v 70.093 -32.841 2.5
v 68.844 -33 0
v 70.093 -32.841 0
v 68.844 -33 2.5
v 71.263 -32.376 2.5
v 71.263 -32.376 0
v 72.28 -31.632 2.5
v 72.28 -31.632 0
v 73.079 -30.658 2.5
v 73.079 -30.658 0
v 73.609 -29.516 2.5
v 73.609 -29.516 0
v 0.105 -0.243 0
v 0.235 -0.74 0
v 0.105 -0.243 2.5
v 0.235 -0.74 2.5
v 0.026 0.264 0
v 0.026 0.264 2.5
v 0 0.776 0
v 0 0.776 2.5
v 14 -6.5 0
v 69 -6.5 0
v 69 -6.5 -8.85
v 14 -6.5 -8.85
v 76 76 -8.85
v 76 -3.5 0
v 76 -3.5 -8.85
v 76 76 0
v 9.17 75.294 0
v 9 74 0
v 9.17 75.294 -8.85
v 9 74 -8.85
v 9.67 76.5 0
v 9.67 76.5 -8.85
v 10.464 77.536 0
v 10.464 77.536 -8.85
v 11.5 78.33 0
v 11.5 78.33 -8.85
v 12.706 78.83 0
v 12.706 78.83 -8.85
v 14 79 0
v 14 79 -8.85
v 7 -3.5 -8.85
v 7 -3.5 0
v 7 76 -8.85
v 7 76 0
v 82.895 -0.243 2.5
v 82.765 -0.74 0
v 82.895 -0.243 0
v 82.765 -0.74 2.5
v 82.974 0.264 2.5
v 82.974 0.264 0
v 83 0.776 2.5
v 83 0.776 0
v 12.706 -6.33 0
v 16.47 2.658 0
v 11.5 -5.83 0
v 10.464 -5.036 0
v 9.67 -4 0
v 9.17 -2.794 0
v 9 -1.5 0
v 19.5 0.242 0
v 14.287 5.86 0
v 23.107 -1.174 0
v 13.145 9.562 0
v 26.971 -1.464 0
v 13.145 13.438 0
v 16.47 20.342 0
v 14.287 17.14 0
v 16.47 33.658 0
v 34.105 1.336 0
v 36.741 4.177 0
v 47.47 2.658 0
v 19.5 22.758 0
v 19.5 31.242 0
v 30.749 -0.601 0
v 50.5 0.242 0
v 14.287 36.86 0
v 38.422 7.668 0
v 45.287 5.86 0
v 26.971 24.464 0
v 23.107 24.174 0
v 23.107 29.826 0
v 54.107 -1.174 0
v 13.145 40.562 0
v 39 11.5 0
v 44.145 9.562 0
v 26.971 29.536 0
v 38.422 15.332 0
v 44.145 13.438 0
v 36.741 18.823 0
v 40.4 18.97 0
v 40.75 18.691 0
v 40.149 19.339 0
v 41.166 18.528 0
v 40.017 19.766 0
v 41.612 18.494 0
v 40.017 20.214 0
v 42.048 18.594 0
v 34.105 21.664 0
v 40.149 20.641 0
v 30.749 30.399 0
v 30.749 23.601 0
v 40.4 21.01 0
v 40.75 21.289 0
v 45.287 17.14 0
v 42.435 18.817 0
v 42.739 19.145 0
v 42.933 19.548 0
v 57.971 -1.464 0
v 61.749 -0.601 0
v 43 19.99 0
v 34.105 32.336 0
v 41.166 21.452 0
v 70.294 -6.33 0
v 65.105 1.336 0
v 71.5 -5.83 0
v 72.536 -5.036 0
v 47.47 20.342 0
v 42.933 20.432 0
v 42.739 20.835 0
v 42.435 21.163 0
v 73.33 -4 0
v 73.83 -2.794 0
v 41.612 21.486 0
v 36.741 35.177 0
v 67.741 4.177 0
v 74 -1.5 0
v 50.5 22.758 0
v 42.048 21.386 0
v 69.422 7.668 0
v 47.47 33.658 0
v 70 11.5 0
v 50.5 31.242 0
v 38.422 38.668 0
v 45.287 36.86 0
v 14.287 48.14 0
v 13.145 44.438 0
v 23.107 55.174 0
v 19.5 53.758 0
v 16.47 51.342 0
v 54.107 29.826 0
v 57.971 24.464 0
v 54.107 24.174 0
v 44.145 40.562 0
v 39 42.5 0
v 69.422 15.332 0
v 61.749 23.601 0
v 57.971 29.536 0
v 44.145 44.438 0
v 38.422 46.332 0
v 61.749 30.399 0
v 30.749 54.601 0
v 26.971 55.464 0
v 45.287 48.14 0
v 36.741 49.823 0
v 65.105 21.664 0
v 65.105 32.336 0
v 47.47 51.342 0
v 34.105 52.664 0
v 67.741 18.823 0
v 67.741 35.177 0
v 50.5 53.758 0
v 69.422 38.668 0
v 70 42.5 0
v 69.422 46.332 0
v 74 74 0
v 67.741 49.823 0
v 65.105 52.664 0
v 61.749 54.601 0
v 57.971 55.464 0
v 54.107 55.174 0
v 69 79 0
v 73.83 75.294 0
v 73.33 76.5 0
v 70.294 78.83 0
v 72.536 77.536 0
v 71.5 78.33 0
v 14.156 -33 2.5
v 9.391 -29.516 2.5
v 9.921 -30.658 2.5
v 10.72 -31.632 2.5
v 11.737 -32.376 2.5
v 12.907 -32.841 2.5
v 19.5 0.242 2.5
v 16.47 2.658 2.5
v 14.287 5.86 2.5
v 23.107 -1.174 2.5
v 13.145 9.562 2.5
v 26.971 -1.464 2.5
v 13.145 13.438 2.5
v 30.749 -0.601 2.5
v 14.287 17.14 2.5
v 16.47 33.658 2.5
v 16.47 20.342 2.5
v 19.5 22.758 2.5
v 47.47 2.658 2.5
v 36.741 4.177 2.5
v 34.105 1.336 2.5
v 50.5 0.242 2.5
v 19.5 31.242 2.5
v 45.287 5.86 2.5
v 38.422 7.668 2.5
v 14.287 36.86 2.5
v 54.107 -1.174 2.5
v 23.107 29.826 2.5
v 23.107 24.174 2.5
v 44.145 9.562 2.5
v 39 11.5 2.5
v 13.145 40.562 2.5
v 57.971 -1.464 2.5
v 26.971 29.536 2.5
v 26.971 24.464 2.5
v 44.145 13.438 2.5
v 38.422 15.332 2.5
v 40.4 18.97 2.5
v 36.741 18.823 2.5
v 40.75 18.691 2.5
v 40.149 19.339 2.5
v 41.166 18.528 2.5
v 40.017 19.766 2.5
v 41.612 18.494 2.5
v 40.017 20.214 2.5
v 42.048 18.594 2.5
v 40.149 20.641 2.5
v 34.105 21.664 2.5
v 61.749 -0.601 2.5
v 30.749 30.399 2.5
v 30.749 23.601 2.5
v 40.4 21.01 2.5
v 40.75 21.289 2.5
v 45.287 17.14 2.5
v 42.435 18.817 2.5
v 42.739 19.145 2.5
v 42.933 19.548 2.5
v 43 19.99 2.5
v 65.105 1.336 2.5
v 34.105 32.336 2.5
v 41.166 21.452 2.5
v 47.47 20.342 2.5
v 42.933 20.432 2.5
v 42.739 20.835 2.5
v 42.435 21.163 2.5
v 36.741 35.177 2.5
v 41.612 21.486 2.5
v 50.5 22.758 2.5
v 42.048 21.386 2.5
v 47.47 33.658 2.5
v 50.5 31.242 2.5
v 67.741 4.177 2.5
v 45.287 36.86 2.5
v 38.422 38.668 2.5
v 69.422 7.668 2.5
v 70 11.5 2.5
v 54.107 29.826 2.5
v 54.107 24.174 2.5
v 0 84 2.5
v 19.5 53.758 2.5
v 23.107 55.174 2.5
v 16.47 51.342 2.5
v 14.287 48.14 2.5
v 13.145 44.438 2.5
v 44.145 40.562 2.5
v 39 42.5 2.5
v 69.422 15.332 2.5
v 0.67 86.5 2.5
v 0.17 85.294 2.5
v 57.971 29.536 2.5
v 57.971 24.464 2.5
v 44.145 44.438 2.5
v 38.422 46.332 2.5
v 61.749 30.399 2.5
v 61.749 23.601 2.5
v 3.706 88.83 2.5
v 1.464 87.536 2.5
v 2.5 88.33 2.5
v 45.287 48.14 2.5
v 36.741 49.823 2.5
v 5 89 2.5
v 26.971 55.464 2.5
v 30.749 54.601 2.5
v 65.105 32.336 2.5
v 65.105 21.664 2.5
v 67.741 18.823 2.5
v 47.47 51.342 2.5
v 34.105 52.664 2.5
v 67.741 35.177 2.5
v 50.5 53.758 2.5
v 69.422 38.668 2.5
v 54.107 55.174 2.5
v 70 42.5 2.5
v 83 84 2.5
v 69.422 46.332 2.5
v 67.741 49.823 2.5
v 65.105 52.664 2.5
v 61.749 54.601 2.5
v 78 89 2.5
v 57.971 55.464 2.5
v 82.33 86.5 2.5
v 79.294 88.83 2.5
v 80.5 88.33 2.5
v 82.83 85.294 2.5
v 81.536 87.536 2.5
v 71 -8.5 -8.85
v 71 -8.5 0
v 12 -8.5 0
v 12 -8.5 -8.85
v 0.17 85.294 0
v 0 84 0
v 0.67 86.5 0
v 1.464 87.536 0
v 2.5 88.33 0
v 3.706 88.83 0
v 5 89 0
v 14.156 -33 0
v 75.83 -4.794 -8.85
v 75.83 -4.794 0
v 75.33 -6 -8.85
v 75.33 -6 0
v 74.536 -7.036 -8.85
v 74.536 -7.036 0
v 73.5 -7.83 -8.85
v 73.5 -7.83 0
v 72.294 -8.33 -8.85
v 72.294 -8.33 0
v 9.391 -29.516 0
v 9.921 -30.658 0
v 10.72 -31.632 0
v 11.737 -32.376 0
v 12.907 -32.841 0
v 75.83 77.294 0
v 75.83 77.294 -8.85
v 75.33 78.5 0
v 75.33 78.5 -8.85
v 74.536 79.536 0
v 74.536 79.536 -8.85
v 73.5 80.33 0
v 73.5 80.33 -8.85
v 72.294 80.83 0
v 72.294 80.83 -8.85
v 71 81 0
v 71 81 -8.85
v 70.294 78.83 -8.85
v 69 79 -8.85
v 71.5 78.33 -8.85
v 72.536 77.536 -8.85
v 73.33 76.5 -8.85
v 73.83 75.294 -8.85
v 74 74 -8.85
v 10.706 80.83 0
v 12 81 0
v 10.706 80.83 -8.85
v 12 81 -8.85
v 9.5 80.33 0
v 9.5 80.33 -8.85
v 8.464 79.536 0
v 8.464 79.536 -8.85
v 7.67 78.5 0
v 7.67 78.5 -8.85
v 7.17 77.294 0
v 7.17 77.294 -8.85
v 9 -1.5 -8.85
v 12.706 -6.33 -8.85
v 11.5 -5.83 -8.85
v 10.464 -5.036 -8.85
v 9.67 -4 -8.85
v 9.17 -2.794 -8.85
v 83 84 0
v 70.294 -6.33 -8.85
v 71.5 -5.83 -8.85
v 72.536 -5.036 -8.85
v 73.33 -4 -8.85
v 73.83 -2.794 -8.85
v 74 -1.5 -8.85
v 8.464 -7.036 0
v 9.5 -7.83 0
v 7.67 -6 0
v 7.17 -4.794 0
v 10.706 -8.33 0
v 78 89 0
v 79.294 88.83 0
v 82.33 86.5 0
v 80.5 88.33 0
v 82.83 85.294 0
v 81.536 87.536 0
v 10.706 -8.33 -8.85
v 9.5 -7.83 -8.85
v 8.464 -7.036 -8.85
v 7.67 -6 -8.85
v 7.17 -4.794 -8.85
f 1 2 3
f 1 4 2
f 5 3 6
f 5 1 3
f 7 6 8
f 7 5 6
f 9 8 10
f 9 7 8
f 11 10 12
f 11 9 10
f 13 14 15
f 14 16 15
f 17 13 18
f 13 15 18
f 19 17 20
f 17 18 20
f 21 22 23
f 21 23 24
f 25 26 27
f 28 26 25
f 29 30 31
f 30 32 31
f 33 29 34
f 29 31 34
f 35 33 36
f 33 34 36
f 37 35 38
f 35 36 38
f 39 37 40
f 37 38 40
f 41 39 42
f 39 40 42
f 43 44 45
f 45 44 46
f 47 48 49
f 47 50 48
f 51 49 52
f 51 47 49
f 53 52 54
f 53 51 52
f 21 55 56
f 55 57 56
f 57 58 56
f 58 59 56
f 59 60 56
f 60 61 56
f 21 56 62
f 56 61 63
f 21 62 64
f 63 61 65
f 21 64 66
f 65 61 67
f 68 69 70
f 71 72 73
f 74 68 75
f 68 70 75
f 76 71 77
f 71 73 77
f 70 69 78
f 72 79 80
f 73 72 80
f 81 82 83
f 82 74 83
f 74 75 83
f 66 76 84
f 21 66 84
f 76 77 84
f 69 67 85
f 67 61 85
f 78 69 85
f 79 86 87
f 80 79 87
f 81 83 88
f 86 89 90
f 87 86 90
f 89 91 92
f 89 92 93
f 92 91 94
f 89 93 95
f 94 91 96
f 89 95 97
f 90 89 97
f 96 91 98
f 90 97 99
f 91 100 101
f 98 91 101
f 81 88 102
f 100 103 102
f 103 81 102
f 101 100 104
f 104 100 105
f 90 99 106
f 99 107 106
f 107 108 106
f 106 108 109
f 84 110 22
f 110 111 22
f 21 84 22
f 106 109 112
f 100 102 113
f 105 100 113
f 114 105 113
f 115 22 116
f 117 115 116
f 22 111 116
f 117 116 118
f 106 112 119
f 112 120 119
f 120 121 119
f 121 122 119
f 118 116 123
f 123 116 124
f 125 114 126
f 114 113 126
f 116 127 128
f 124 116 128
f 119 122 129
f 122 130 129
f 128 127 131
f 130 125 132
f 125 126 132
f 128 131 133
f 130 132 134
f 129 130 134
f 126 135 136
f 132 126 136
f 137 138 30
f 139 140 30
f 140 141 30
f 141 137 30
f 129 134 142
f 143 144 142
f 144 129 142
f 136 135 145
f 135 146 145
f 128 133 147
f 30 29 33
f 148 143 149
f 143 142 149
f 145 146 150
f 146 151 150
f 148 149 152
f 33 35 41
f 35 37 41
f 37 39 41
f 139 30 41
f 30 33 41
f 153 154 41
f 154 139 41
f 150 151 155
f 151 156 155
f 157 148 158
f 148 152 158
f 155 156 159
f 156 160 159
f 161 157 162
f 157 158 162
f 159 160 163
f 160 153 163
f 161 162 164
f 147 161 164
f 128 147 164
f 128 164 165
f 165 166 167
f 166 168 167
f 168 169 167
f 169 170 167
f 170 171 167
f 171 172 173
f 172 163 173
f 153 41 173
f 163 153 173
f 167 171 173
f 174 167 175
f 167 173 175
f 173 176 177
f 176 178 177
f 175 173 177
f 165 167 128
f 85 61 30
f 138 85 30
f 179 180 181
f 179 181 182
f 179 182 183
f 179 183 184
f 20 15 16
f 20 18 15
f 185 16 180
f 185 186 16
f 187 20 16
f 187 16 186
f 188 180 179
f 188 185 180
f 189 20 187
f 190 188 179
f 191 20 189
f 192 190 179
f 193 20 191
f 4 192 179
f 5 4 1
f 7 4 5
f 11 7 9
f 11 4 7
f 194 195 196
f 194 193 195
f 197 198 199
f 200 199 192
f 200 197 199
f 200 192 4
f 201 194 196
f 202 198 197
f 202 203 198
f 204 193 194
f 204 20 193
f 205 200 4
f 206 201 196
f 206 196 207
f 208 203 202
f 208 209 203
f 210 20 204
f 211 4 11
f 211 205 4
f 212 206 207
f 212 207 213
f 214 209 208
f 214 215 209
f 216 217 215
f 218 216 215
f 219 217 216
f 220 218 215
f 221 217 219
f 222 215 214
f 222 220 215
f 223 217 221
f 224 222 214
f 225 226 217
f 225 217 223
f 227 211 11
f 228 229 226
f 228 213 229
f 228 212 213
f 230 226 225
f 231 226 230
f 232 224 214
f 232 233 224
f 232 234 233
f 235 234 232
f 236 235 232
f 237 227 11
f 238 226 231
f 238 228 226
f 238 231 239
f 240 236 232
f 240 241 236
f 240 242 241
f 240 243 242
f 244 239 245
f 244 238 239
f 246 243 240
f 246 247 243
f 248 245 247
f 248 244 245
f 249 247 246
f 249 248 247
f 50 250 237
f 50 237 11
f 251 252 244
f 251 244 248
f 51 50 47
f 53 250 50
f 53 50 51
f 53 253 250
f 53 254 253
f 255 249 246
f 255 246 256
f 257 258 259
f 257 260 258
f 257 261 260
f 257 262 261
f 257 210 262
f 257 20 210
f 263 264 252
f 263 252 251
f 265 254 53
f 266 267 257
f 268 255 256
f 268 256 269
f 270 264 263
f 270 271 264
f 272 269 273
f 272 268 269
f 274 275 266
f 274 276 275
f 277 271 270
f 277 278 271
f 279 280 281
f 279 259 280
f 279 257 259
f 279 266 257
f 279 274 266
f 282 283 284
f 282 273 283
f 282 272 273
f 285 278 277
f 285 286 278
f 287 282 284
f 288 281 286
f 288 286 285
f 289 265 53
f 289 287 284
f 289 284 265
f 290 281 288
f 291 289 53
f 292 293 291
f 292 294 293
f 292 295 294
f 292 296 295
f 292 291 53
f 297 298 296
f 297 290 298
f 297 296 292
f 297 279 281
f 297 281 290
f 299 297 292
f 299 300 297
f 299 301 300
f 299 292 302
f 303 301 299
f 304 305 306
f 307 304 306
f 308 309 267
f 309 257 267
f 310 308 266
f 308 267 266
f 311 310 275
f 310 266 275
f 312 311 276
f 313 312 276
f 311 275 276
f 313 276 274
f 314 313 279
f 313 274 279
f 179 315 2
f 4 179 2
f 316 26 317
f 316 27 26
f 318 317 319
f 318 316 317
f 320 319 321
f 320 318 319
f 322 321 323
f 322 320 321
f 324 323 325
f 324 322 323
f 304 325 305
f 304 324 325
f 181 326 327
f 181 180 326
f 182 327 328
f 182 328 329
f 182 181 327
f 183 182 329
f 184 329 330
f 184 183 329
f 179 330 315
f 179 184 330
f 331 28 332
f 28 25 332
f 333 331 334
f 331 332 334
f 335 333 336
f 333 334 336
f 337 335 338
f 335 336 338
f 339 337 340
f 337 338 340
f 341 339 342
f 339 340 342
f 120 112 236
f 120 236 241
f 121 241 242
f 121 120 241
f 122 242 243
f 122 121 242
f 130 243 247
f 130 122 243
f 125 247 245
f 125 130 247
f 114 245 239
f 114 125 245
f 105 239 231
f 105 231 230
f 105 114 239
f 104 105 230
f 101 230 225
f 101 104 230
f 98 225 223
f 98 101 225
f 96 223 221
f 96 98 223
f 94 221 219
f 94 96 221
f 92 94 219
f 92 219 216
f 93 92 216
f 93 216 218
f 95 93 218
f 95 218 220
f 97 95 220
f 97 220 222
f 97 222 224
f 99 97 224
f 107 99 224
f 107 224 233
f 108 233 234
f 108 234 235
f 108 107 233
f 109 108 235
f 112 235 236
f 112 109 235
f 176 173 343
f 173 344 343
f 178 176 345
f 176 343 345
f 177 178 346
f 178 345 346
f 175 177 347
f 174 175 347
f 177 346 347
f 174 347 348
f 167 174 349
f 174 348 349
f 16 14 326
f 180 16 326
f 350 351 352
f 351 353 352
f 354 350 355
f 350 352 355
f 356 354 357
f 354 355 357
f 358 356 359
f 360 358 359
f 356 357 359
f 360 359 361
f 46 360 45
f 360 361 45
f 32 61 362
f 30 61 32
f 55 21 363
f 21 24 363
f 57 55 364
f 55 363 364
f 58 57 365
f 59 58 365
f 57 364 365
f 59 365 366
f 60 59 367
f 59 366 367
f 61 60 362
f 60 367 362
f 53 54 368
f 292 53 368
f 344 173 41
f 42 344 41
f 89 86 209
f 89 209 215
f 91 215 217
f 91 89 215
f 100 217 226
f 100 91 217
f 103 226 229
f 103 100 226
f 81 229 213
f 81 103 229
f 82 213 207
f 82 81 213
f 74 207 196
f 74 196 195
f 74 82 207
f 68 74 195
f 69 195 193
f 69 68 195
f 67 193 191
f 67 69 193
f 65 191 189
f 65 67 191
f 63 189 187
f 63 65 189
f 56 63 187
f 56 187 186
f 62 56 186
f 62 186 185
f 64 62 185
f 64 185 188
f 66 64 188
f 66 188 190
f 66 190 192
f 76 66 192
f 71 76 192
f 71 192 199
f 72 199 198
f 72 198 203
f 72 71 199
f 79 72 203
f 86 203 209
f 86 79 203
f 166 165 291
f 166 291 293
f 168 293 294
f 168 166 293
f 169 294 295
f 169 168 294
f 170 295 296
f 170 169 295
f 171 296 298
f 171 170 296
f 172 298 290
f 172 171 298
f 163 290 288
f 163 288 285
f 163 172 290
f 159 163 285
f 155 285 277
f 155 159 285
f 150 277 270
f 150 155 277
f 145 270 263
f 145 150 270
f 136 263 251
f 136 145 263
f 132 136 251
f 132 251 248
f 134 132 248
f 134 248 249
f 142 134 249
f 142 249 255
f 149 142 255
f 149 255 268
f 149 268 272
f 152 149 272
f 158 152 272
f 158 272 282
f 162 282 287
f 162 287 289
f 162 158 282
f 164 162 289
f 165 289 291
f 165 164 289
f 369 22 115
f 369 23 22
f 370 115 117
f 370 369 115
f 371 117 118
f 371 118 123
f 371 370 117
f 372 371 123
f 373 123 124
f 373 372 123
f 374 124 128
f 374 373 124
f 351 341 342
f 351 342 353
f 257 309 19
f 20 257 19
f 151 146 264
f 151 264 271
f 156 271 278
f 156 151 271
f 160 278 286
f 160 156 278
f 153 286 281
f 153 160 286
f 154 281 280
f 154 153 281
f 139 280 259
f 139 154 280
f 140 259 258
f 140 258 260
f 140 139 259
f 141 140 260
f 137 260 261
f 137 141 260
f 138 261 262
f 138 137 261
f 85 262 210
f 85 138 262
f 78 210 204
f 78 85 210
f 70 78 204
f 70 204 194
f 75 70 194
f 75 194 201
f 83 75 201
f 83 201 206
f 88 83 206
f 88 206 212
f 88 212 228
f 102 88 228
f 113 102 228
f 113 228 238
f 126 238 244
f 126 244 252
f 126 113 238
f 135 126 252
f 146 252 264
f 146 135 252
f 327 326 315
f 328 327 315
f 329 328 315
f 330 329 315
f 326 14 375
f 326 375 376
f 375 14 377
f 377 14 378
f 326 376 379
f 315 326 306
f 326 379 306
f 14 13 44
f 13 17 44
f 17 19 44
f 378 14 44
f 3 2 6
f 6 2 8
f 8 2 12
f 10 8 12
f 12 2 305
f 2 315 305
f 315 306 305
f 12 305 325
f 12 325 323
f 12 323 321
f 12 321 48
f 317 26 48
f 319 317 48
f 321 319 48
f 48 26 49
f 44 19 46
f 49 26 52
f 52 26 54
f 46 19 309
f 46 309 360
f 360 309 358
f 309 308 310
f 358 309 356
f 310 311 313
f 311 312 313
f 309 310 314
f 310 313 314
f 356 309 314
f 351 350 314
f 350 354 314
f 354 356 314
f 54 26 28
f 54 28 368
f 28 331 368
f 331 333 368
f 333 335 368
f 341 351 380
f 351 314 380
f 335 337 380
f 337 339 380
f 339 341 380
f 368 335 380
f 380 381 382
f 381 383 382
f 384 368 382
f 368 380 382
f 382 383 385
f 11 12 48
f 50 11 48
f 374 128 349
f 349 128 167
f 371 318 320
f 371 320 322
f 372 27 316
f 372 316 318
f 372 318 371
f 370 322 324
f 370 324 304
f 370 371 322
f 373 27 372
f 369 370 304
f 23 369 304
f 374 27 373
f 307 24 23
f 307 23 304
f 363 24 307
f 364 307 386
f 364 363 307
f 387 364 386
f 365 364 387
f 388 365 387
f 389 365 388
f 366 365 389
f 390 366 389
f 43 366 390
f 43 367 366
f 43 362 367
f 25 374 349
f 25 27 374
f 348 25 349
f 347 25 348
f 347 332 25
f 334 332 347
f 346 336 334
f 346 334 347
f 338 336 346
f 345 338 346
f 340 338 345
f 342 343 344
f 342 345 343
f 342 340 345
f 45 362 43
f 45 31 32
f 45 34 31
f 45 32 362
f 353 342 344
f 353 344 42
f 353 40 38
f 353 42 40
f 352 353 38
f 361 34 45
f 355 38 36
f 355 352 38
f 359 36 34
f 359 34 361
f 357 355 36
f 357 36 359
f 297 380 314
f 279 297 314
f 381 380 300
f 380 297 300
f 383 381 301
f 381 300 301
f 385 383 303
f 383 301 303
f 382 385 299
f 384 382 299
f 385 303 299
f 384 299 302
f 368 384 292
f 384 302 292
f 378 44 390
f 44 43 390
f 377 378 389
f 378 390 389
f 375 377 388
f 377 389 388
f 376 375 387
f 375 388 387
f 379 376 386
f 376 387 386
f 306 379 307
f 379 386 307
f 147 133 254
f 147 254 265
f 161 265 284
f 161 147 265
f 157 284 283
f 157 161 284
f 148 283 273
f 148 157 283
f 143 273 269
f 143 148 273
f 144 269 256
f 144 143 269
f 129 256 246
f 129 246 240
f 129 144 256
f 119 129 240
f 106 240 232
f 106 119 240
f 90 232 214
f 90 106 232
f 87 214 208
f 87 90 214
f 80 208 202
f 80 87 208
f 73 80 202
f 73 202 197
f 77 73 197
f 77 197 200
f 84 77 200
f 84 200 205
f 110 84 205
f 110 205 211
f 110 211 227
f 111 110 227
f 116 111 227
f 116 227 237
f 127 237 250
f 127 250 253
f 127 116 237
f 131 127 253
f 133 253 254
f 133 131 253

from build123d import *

# Parameters (mm, degrees)
SKETCH1_R           = 13
SKETCH1_R_2         = 1.5
BOSS_EXTRUDE1_DEPTH = 2.5
SKETCH2_W           = 69
SKETCH2_H           = 89.5
SKETCH2_W_2         = 65
SKETCH2_H_2         = 85.5
BOSS_EXTRUDE2_DEPTH = 8.85
FILLET1_R           = 5


with BuildPart() as part:
    # Sketch1 → Boss-Extrude1 (new body)
    with BuildSketch(Plane.XY):
        Polygon((0, 0), (10.5, -33), (72.5, -33), (83, 0), (83, 89), (0, 89), align=None)
        with Locations((26, 42.5)):
            Circle(SKETCH1_R, mode=Mode.SUBTRACT)
        with Locations((57, 42.5)):
            Circle(SKETCH1_R, mode=Mode.SUBTRACT)
        with Locations((26, 11.5)):
            Circle(SKETCH1_R, mode=Mode.SUBTRACT)
        with Locations((57, 11.5)):
            Circle(SKETCH1_R, mode=Mode.SUBTRACT)
        with Locations((41.5, 19.99)):
            Circle(SKETCH1_R_2, mode=Mode.SUBTRACT)
    extrude(amount=BOSS_EXTRUDE1_DEPTH)

    # Sketch2 → Boss-Extrude2 (add)
    with BuildSketch(Plane(origin=(0, 0, 0), x_dir=(-1, 0, 0), z_dir=(0, 0, -1))):
        with Locations((-41.5, 36.25)):
            Rectangle(SKETCH2_W, SKETCH2_H)
        with Locations((-41.5, 36.25)):
            Rectangle(SKETCH2_W_2, SKETCH2_H_2, mode=Mode.SUBTRACT)
    extrude(amount=BOSS_EXTRUDE2_DEPTH)

    # Fillet1
    fillet1_edges = [part.edges().sort_by_distance(p)[0] for p in [
        (0, 89, 1.25),
        (83, 89, 1.25),
        (83, 0, 1.25),
        (72.5, -33, 1.25),
        (10.5, -33, 1.25),
        (0, 0, 1.25),
        (74, -6.5, -4.425),
        (74, 79, -4.425),
        (9, 79, -4.425),
        (7, -8.5, -4.425),
        (7, 81, -4.425),
        (76, 81, -4.425),
        (76, -8.5, -4.425),
        (9, -6.5, -4.425),
    ]]
    fillet(fillet1_edges, radius=FILLET1_R)


solid = part.part
